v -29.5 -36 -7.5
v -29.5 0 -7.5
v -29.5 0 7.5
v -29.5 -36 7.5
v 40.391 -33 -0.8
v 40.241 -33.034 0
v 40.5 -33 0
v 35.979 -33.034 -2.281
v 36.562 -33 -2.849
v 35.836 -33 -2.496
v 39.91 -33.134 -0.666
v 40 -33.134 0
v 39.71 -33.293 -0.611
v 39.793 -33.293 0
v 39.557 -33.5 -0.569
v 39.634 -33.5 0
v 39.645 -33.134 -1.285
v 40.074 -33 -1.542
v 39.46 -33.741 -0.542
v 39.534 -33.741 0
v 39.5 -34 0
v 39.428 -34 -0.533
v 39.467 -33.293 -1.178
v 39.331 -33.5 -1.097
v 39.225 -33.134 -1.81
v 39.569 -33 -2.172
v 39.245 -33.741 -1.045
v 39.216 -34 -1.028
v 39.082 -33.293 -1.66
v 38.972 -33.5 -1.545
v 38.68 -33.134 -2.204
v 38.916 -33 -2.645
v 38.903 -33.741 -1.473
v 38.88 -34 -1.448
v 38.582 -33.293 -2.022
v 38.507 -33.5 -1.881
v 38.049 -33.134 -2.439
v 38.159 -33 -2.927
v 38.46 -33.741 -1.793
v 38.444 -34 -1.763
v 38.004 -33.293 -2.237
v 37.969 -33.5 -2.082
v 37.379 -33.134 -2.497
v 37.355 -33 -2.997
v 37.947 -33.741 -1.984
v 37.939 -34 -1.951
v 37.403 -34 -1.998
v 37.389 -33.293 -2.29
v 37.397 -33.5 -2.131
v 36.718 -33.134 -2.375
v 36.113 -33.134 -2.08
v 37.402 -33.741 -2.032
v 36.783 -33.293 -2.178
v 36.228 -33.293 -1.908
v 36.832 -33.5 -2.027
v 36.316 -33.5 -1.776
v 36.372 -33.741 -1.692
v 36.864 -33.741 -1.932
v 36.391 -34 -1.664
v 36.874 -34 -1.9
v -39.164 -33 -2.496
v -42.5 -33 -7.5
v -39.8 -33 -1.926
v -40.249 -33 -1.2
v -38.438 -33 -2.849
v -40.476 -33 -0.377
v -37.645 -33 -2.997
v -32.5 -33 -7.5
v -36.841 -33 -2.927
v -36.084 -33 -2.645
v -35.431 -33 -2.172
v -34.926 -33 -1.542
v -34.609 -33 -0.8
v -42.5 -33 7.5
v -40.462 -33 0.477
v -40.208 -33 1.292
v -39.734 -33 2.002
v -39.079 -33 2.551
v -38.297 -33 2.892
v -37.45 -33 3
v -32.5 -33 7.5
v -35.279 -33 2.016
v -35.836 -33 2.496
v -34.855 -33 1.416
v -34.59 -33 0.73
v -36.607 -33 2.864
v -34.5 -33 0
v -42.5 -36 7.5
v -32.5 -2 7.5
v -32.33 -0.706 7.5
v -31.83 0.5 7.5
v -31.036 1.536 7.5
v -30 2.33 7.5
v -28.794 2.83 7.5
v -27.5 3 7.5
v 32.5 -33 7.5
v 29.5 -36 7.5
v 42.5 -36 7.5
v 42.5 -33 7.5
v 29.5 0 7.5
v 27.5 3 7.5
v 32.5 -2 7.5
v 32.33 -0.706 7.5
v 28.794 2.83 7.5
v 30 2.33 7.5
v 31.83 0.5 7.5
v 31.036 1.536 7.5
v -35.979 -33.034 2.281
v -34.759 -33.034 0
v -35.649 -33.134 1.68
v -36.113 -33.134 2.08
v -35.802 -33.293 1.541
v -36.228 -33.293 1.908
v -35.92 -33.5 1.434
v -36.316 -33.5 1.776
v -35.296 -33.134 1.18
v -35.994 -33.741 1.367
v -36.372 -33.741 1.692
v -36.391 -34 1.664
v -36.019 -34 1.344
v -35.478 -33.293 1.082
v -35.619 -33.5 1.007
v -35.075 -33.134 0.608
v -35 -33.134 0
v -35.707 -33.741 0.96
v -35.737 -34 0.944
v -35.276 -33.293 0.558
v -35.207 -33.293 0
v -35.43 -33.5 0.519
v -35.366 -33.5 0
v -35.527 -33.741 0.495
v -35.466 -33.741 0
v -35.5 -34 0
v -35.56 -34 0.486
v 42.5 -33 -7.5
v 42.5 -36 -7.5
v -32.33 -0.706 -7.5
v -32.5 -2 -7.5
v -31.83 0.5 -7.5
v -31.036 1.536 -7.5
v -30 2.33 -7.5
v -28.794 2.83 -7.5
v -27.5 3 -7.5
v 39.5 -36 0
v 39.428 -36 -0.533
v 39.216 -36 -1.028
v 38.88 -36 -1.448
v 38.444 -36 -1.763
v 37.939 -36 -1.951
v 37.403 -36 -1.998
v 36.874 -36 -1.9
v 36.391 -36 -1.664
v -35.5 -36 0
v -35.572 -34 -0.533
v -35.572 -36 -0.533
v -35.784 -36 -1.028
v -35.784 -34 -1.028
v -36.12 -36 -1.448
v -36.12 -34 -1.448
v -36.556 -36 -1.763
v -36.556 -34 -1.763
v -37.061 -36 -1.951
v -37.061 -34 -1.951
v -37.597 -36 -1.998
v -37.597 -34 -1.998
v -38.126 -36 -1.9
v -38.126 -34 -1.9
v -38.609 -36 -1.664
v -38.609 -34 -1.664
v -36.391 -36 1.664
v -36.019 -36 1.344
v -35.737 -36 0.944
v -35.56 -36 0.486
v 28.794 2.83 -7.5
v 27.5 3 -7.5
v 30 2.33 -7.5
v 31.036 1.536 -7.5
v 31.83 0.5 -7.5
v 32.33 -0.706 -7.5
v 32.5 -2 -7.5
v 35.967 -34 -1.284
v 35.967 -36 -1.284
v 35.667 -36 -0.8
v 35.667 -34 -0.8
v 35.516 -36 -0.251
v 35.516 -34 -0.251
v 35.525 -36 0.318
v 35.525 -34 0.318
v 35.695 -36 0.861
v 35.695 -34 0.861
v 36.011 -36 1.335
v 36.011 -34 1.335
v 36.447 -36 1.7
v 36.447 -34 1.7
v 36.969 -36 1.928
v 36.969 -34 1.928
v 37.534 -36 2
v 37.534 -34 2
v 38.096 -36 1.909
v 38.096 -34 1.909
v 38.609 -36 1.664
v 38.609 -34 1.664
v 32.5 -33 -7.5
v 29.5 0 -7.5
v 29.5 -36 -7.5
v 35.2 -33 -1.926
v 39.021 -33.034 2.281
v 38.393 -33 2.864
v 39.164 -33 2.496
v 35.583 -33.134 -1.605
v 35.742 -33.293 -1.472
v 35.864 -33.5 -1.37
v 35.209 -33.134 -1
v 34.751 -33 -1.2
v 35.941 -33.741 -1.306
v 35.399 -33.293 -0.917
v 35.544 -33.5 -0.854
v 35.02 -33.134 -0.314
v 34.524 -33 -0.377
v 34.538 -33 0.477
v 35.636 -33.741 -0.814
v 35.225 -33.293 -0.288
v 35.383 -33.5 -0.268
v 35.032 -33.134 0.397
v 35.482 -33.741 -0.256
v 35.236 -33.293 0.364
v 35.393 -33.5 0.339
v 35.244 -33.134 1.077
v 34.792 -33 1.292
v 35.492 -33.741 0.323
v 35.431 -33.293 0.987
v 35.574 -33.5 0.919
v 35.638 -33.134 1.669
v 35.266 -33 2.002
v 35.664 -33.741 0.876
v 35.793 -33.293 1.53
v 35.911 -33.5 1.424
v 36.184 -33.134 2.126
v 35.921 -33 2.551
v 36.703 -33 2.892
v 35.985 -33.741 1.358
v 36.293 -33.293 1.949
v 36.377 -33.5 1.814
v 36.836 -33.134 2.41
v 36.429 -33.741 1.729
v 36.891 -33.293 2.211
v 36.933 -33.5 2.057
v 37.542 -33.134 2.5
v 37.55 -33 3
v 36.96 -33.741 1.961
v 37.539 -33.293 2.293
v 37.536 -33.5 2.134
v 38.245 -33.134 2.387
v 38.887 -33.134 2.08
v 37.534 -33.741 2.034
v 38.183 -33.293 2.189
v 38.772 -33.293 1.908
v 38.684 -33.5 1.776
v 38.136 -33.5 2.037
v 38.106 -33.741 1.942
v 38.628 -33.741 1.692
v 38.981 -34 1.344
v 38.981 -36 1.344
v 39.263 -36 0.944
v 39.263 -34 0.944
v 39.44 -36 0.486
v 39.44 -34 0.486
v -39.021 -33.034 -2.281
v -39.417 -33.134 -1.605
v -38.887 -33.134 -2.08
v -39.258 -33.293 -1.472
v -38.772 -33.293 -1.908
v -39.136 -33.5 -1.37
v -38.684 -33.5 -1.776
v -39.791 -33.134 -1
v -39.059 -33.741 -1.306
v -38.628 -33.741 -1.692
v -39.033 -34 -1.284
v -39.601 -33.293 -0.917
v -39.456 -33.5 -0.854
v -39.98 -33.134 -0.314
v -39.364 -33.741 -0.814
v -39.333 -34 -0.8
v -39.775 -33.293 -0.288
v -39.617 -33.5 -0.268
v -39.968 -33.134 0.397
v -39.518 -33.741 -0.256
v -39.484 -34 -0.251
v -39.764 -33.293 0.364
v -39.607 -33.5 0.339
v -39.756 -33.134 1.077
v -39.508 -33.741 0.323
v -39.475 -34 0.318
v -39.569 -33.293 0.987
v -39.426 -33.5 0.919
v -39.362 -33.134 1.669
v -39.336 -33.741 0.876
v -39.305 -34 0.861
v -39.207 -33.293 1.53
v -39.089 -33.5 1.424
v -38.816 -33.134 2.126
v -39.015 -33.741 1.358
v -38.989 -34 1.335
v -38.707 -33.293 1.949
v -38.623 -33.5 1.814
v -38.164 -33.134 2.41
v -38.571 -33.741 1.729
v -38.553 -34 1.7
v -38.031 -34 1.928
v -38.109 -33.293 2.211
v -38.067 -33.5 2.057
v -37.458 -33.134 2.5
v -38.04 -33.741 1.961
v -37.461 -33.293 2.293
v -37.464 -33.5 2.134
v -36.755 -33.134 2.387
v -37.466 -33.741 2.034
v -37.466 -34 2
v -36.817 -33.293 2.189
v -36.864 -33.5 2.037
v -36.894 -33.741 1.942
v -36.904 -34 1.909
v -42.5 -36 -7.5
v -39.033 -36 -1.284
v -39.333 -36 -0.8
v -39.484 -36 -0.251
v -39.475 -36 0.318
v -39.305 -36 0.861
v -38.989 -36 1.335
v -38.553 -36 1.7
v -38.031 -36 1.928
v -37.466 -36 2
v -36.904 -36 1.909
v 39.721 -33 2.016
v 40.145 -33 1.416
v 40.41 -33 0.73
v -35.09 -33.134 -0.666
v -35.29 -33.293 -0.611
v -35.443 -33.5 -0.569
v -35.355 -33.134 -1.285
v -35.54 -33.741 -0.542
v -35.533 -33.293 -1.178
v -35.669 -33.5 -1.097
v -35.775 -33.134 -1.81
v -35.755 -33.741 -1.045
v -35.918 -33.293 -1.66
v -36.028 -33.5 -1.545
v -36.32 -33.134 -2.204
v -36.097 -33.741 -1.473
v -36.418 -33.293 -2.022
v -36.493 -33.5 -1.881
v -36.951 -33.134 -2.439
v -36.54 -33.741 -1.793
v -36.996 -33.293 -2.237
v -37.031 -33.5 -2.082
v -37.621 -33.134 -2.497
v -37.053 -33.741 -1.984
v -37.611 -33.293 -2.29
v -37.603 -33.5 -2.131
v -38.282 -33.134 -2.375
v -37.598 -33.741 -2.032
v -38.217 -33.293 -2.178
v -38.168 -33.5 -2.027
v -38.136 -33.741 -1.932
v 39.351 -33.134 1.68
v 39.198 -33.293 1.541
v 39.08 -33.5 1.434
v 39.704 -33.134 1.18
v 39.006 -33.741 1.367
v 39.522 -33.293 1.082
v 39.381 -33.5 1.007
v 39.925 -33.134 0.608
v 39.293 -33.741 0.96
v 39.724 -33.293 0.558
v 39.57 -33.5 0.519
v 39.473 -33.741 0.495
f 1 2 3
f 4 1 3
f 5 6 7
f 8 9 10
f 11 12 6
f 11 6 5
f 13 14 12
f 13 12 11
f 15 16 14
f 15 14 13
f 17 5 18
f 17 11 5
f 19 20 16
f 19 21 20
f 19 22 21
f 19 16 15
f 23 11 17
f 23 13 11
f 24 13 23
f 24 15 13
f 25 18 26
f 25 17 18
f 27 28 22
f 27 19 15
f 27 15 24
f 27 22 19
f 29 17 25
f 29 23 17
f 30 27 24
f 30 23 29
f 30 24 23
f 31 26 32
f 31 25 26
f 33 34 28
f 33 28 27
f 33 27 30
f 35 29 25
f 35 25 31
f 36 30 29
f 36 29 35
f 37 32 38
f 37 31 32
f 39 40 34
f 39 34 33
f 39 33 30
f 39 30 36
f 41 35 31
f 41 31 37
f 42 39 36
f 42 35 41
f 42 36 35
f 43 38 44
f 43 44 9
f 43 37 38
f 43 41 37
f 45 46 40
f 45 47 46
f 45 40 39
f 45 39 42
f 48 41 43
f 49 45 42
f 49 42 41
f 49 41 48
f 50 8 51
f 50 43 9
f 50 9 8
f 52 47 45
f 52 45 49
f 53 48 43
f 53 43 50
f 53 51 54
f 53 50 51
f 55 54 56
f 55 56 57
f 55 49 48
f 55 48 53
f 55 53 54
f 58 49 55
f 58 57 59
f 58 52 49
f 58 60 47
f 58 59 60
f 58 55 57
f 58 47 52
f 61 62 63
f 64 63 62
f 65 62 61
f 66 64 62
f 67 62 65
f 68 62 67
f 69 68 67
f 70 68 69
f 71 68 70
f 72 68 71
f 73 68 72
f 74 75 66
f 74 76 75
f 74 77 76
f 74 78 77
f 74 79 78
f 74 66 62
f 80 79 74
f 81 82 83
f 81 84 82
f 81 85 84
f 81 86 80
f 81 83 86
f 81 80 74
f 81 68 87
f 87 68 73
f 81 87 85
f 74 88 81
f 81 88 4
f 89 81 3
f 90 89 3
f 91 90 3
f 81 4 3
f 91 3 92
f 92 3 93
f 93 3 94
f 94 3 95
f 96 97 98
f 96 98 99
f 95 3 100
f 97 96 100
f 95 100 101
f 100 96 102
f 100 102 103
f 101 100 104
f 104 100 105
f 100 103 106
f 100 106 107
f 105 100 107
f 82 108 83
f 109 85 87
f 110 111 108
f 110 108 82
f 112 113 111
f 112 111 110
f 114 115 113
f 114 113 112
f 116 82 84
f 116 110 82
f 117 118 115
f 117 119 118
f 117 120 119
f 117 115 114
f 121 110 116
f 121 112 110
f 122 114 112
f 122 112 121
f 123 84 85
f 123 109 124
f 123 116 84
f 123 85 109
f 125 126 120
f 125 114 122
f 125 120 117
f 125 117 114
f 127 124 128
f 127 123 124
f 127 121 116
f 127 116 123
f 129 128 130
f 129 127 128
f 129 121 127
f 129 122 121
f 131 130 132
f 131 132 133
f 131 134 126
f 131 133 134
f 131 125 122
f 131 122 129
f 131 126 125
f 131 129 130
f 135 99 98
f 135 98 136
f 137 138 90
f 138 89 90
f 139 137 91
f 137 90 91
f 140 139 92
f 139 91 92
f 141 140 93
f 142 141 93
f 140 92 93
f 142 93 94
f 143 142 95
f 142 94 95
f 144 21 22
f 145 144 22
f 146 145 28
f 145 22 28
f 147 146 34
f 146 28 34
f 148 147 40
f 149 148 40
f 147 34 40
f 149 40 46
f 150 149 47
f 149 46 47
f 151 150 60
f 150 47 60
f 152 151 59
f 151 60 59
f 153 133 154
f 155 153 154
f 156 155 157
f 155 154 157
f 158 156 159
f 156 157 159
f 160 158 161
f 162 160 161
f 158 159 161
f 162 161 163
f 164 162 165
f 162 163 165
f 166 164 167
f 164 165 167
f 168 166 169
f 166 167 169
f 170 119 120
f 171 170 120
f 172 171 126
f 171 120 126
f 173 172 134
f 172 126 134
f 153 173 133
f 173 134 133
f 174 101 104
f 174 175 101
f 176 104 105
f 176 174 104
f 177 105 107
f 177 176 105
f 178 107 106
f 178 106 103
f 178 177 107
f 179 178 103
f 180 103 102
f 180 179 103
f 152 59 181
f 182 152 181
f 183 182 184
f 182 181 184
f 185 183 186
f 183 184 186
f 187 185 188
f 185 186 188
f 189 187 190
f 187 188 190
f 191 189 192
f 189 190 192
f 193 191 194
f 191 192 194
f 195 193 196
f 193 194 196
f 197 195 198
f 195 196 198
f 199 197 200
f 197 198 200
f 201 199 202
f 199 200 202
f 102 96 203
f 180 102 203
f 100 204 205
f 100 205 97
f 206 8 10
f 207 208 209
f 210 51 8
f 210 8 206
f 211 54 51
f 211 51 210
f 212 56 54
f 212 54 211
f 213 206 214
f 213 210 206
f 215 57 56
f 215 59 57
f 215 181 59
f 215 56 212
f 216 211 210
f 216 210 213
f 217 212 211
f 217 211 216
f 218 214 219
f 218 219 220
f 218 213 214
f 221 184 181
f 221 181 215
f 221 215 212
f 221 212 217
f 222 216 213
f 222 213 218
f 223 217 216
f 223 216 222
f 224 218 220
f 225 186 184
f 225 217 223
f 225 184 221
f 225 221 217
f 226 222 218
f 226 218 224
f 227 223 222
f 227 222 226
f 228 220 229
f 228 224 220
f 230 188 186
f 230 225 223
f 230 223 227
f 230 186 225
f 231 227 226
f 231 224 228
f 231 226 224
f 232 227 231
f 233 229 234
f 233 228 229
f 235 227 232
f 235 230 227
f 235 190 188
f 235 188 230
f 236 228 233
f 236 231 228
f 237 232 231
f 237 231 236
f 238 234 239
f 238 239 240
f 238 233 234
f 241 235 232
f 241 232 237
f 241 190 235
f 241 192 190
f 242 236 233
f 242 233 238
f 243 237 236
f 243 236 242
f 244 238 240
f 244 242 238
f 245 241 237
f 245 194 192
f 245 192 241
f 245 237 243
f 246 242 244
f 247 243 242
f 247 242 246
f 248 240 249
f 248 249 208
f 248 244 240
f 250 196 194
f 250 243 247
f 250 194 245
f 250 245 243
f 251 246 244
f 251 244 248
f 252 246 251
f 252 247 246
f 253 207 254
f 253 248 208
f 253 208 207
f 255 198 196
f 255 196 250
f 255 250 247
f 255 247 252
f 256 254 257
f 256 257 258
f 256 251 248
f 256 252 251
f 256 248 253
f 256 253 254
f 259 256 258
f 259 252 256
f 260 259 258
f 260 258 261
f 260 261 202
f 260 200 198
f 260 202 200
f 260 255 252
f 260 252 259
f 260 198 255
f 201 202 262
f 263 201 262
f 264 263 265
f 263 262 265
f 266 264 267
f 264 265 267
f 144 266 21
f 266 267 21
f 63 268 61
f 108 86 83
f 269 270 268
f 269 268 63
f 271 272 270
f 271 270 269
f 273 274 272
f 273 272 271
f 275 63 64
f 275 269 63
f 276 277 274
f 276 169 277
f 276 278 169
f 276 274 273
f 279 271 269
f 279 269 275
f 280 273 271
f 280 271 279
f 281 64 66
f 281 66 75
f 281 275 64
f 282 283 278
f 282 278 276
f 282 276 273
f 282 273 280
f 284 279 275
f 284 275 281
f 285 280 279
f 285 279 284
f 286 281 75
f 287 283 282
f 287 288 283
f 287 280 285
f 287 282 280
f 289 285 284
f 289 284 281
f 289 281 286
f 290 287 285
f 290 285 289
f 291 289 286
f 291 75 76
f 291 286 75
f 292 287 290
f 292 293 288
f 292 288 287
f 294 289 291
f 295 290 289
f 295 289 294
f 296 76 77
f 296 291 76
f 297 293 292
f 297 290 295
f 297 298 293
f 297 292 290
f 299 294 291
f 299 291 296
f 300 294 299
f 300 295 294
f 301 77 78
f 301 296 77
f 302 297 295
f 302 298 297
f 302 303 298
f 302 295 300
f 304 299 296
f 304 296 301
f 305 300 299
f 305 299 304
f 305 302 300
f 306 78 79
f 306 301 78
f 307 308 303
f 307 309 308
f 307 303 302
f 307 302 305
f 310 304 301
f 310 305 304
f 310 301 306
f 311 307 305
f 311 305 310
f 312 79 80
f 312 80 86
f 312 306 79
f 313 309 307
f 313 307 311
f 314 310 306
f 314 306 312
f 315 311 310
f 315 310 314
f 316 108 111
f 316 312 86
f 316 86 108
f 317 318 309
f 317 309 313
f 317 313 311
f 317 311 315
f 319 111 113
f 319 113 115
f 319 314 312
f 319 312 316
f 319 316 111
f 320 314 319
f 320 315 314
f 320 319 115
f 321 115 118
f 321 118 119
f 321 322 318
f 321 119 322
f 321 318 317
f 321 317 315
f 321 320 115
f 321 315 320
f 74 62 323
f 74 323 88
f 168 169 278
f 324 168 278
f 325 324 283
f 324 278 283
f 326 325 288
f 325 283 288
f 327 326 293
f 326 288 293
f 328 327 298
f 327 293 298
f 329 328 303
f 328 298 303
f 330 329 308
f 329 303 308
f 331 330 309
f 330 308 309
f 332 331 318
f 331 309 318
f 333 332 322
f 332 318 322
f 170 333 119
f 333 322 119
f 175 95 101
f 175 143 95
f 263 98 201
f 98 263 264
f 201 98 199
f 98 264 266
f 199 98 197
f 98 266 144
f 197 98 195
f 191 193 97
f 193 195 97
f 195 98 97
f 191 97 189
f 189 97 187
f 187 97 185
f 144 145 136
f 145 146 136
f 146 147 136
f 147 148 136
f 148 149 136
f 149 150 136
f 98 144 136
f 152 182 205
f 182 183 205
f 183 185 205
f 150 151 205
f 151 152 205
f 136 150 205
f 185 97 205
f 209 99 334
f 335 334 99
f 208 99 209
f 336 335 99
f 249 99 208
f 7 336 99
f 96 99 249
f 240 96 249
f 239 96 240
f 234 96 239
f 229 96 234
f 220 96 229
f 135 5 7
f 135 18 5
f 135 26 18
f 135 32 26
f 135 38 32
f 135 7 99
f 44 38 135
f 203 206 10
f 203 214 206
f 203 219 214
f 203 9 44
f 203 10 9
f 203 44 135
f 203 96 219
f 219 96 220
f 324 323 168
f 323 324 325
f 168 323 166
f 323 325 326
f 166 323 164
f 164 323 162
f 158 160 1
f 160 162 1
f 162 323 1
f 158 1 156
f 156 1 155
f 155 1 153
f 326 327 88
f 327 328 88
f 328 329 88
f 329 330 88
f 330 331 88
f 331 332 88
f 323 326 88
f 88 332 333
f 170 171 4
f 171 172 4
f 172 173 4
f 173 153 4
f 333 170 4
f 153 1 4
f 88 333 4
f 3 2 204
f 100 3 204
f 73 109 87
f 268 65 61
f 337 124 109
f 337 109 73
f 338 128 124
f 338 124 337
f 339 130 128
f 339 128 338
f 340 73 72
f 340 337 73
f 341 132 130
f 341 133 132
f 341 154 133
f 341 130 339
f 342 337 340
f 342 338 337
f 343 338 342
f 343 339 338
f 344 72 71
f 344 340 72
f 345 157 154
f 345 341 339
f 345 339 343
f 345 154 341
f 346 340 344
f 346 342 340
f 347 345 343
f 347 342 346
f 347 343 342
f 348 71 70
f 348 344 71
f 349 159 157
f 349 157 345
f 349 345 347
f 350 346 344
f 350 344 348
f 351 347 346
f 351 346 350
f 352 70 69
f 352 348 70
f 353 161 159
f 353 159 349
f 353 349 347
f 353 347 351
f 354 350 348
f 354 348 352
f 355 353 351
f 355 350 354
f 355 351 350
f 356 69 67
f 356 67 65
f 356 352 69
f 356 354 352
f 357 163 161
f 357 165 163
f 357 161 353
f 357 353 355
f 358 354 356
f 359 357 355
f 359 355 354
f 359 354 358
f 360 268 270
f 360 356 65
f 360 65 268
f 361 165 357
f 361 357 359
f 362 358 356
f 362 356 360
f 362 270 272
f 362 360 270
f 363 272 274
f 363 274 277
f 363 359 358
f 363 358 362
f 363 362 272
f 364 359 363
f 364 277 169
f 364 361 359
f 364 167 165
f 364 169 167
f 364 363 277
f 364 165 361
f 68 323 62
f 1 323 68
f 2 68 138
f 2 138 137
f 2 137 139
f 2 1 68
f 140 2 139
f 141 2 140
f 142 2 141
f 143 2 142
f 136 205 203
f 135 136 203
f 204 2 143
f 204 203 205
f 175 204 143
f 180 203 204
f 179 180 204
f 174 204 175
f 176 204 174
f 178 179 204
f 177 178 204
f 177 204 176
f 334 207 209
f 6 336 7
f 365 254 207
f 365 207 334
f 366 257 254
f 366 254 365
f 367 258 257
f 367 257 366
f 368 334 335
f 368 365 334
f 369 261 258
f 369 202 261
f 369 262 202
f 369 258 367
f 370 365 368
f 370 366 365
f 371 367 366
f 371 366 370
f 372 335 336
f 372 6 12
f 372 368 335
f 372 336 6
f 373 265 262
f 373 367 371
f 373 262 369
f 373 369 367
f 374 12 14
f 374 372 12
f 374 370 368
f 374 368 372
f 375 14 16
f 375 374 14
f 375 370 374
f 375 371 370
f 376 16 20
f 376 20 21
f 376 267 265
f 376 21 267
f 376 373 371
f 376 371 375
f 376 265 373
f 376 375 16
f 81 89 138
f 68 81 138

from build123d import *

# Parameters (mm, degrees)
BOSS_EXTRUDE1_DEPTH = 3
SKETCH3_W           = 3
SKETCH3_H           = 15
BOSS_EXTRUDE2_DEPTH = 36
SKETCH5_W           = 15
SKETCH5_H           = 3
BOSS_EXTRUDE3_DEPTH = 10
SKETCH6_W           = 15
SKETCH6_H           = 3
BOSS_EXTRUDE4_DEPTH = 10
CUT_EXTRUDE1_DEPTH  = 3
FILLET1_R           = 5
FILLET2_R           = 1


with BuildPart() as part:
    # Sketch2 → Boss-Extrude1 (new body)
    with BuildSketch(Plane(origin=(0, 0, 0), x_dir=(1, 0, 0), z_dir=(0, 1, 0))):
        Polygon((32.5, 0), (0, 0), (-32.5, 0), (-32.5, -7.5), (32.5, -7.5), align=None)
        Polygon((-32.5, 0), (0, 0), (32.5, 0), (32.5, 7.5), (-32.5, 7.5), align=None)
    extrude(amount=BOSS_EXTRUDE1_DEPTH)

    # Sketch3 → Boss-Extrude2 (add)
    with BuildSketch(Plane.XZ):
        Polygon((-29.5, 7.5), (-32.5, 7.5), (-32.5, -7.5), align=None)
        Polygon((-29.5, -7.5), (-29.5, 7.5), (-32.5, -7.5), align=None)
        with Locations((31, 0)):
            Rectangle(SKETCH3_W, SKETCH3_H)
    extrude(amount=BOSS_EXTRUDE2_DEPTH)

    # Sketch5 → Boss-Extrude3 (add)
    with BuildSketch(Plane(origin=(32.5, 0, 0), x_dir=(0, 0, -1), z_dir=(1, 0, 0))):
        with Locations((0, -34.5)):
            Rectangle(SKETCH5_W, SKETCH5_H)
    extrude(amount=BOSS_EXTRUDE3_DEPTH)

    # Sketch6 → Boss-Extrude4 (add)
    with BuildSketch(Plane.ZY.offset(32.5)):
        with Locations((0, -34.5)):
            Rectangle(SKETCH6_W, SKETCH6_H)
    extrude(amount=BOSS_EXTRUDE4_DEPTH)

    # Sketch7 → Cut-Extrude1 (cut)
    with BuildSketch(Plane(origin=(0, -33, 0), x_dir=(1, 0, 0), z_dir=(0, 1, 0))):
        with BuildLine():
            ThreePointArc((-35.5, 0), (-36.556284149, 1.763349198), (-38.609400392, 1.664100589))
            Line((-38.609400392, 1.664100589), (-36.390599608, -1.664100589))
            ThreePointArc((-36.390599608, -1.664100589), (-35.736650802, -0.943715851), (-35.5, 0))
        make_face()
        with BuildLine():
            Line((-36.390599608, -1.664100589), (-38.609400392, 1.664100589))
            ThreePointArc((-38.609400392, 1.664100589), (-39.164100589, -1.109400392), (-36.390599608, -1.664100589))
        make_face()
        with BuildLine():
            ThreePointArc((36.390599608, 1.664100589), (35.835899411, -1.109400392), (38.609400392, -1.664100589))
            Line((38.609400392, -1.664100589), (36.390599608, 1.664100589))
        make_face()
        with BuildLine():
            Line((36.390599608, 1.664100589), (38.609400392, -1.664100589))
            ThreePointArc((38.609400392, -1.664100589), (39.263349198, -0.943715851), (39.5, 0))
            ThreePointArc((39.5, 0), (38.443715851, 1.763349198), (36.390599608, 1.664100589))
        make_face()
    extrude(amount=-CUT_EXTRUDE1_DEPTH, mode=Mode.SUBTRACT)

    # Fillet1
    fillet1_edges = [part.edges().sort_by_distance(p)[0] for p in [
        (32.5, 3, 0),
        (-32.5, 3, 0),
    ]]
    fillet(fillet1_edges, radius=FILLET1_R)

    # Fillet2
    fillet2_edges = [part.edges().sort_by_distance(p)[0] for p in [
        (-38.609400392, -33, -1.664100589),
        (38.609400392, -33, 1.664100589),
    ]]
    fillet(fillet2_edges, radius=FILLET2_R)


solid = part.part
